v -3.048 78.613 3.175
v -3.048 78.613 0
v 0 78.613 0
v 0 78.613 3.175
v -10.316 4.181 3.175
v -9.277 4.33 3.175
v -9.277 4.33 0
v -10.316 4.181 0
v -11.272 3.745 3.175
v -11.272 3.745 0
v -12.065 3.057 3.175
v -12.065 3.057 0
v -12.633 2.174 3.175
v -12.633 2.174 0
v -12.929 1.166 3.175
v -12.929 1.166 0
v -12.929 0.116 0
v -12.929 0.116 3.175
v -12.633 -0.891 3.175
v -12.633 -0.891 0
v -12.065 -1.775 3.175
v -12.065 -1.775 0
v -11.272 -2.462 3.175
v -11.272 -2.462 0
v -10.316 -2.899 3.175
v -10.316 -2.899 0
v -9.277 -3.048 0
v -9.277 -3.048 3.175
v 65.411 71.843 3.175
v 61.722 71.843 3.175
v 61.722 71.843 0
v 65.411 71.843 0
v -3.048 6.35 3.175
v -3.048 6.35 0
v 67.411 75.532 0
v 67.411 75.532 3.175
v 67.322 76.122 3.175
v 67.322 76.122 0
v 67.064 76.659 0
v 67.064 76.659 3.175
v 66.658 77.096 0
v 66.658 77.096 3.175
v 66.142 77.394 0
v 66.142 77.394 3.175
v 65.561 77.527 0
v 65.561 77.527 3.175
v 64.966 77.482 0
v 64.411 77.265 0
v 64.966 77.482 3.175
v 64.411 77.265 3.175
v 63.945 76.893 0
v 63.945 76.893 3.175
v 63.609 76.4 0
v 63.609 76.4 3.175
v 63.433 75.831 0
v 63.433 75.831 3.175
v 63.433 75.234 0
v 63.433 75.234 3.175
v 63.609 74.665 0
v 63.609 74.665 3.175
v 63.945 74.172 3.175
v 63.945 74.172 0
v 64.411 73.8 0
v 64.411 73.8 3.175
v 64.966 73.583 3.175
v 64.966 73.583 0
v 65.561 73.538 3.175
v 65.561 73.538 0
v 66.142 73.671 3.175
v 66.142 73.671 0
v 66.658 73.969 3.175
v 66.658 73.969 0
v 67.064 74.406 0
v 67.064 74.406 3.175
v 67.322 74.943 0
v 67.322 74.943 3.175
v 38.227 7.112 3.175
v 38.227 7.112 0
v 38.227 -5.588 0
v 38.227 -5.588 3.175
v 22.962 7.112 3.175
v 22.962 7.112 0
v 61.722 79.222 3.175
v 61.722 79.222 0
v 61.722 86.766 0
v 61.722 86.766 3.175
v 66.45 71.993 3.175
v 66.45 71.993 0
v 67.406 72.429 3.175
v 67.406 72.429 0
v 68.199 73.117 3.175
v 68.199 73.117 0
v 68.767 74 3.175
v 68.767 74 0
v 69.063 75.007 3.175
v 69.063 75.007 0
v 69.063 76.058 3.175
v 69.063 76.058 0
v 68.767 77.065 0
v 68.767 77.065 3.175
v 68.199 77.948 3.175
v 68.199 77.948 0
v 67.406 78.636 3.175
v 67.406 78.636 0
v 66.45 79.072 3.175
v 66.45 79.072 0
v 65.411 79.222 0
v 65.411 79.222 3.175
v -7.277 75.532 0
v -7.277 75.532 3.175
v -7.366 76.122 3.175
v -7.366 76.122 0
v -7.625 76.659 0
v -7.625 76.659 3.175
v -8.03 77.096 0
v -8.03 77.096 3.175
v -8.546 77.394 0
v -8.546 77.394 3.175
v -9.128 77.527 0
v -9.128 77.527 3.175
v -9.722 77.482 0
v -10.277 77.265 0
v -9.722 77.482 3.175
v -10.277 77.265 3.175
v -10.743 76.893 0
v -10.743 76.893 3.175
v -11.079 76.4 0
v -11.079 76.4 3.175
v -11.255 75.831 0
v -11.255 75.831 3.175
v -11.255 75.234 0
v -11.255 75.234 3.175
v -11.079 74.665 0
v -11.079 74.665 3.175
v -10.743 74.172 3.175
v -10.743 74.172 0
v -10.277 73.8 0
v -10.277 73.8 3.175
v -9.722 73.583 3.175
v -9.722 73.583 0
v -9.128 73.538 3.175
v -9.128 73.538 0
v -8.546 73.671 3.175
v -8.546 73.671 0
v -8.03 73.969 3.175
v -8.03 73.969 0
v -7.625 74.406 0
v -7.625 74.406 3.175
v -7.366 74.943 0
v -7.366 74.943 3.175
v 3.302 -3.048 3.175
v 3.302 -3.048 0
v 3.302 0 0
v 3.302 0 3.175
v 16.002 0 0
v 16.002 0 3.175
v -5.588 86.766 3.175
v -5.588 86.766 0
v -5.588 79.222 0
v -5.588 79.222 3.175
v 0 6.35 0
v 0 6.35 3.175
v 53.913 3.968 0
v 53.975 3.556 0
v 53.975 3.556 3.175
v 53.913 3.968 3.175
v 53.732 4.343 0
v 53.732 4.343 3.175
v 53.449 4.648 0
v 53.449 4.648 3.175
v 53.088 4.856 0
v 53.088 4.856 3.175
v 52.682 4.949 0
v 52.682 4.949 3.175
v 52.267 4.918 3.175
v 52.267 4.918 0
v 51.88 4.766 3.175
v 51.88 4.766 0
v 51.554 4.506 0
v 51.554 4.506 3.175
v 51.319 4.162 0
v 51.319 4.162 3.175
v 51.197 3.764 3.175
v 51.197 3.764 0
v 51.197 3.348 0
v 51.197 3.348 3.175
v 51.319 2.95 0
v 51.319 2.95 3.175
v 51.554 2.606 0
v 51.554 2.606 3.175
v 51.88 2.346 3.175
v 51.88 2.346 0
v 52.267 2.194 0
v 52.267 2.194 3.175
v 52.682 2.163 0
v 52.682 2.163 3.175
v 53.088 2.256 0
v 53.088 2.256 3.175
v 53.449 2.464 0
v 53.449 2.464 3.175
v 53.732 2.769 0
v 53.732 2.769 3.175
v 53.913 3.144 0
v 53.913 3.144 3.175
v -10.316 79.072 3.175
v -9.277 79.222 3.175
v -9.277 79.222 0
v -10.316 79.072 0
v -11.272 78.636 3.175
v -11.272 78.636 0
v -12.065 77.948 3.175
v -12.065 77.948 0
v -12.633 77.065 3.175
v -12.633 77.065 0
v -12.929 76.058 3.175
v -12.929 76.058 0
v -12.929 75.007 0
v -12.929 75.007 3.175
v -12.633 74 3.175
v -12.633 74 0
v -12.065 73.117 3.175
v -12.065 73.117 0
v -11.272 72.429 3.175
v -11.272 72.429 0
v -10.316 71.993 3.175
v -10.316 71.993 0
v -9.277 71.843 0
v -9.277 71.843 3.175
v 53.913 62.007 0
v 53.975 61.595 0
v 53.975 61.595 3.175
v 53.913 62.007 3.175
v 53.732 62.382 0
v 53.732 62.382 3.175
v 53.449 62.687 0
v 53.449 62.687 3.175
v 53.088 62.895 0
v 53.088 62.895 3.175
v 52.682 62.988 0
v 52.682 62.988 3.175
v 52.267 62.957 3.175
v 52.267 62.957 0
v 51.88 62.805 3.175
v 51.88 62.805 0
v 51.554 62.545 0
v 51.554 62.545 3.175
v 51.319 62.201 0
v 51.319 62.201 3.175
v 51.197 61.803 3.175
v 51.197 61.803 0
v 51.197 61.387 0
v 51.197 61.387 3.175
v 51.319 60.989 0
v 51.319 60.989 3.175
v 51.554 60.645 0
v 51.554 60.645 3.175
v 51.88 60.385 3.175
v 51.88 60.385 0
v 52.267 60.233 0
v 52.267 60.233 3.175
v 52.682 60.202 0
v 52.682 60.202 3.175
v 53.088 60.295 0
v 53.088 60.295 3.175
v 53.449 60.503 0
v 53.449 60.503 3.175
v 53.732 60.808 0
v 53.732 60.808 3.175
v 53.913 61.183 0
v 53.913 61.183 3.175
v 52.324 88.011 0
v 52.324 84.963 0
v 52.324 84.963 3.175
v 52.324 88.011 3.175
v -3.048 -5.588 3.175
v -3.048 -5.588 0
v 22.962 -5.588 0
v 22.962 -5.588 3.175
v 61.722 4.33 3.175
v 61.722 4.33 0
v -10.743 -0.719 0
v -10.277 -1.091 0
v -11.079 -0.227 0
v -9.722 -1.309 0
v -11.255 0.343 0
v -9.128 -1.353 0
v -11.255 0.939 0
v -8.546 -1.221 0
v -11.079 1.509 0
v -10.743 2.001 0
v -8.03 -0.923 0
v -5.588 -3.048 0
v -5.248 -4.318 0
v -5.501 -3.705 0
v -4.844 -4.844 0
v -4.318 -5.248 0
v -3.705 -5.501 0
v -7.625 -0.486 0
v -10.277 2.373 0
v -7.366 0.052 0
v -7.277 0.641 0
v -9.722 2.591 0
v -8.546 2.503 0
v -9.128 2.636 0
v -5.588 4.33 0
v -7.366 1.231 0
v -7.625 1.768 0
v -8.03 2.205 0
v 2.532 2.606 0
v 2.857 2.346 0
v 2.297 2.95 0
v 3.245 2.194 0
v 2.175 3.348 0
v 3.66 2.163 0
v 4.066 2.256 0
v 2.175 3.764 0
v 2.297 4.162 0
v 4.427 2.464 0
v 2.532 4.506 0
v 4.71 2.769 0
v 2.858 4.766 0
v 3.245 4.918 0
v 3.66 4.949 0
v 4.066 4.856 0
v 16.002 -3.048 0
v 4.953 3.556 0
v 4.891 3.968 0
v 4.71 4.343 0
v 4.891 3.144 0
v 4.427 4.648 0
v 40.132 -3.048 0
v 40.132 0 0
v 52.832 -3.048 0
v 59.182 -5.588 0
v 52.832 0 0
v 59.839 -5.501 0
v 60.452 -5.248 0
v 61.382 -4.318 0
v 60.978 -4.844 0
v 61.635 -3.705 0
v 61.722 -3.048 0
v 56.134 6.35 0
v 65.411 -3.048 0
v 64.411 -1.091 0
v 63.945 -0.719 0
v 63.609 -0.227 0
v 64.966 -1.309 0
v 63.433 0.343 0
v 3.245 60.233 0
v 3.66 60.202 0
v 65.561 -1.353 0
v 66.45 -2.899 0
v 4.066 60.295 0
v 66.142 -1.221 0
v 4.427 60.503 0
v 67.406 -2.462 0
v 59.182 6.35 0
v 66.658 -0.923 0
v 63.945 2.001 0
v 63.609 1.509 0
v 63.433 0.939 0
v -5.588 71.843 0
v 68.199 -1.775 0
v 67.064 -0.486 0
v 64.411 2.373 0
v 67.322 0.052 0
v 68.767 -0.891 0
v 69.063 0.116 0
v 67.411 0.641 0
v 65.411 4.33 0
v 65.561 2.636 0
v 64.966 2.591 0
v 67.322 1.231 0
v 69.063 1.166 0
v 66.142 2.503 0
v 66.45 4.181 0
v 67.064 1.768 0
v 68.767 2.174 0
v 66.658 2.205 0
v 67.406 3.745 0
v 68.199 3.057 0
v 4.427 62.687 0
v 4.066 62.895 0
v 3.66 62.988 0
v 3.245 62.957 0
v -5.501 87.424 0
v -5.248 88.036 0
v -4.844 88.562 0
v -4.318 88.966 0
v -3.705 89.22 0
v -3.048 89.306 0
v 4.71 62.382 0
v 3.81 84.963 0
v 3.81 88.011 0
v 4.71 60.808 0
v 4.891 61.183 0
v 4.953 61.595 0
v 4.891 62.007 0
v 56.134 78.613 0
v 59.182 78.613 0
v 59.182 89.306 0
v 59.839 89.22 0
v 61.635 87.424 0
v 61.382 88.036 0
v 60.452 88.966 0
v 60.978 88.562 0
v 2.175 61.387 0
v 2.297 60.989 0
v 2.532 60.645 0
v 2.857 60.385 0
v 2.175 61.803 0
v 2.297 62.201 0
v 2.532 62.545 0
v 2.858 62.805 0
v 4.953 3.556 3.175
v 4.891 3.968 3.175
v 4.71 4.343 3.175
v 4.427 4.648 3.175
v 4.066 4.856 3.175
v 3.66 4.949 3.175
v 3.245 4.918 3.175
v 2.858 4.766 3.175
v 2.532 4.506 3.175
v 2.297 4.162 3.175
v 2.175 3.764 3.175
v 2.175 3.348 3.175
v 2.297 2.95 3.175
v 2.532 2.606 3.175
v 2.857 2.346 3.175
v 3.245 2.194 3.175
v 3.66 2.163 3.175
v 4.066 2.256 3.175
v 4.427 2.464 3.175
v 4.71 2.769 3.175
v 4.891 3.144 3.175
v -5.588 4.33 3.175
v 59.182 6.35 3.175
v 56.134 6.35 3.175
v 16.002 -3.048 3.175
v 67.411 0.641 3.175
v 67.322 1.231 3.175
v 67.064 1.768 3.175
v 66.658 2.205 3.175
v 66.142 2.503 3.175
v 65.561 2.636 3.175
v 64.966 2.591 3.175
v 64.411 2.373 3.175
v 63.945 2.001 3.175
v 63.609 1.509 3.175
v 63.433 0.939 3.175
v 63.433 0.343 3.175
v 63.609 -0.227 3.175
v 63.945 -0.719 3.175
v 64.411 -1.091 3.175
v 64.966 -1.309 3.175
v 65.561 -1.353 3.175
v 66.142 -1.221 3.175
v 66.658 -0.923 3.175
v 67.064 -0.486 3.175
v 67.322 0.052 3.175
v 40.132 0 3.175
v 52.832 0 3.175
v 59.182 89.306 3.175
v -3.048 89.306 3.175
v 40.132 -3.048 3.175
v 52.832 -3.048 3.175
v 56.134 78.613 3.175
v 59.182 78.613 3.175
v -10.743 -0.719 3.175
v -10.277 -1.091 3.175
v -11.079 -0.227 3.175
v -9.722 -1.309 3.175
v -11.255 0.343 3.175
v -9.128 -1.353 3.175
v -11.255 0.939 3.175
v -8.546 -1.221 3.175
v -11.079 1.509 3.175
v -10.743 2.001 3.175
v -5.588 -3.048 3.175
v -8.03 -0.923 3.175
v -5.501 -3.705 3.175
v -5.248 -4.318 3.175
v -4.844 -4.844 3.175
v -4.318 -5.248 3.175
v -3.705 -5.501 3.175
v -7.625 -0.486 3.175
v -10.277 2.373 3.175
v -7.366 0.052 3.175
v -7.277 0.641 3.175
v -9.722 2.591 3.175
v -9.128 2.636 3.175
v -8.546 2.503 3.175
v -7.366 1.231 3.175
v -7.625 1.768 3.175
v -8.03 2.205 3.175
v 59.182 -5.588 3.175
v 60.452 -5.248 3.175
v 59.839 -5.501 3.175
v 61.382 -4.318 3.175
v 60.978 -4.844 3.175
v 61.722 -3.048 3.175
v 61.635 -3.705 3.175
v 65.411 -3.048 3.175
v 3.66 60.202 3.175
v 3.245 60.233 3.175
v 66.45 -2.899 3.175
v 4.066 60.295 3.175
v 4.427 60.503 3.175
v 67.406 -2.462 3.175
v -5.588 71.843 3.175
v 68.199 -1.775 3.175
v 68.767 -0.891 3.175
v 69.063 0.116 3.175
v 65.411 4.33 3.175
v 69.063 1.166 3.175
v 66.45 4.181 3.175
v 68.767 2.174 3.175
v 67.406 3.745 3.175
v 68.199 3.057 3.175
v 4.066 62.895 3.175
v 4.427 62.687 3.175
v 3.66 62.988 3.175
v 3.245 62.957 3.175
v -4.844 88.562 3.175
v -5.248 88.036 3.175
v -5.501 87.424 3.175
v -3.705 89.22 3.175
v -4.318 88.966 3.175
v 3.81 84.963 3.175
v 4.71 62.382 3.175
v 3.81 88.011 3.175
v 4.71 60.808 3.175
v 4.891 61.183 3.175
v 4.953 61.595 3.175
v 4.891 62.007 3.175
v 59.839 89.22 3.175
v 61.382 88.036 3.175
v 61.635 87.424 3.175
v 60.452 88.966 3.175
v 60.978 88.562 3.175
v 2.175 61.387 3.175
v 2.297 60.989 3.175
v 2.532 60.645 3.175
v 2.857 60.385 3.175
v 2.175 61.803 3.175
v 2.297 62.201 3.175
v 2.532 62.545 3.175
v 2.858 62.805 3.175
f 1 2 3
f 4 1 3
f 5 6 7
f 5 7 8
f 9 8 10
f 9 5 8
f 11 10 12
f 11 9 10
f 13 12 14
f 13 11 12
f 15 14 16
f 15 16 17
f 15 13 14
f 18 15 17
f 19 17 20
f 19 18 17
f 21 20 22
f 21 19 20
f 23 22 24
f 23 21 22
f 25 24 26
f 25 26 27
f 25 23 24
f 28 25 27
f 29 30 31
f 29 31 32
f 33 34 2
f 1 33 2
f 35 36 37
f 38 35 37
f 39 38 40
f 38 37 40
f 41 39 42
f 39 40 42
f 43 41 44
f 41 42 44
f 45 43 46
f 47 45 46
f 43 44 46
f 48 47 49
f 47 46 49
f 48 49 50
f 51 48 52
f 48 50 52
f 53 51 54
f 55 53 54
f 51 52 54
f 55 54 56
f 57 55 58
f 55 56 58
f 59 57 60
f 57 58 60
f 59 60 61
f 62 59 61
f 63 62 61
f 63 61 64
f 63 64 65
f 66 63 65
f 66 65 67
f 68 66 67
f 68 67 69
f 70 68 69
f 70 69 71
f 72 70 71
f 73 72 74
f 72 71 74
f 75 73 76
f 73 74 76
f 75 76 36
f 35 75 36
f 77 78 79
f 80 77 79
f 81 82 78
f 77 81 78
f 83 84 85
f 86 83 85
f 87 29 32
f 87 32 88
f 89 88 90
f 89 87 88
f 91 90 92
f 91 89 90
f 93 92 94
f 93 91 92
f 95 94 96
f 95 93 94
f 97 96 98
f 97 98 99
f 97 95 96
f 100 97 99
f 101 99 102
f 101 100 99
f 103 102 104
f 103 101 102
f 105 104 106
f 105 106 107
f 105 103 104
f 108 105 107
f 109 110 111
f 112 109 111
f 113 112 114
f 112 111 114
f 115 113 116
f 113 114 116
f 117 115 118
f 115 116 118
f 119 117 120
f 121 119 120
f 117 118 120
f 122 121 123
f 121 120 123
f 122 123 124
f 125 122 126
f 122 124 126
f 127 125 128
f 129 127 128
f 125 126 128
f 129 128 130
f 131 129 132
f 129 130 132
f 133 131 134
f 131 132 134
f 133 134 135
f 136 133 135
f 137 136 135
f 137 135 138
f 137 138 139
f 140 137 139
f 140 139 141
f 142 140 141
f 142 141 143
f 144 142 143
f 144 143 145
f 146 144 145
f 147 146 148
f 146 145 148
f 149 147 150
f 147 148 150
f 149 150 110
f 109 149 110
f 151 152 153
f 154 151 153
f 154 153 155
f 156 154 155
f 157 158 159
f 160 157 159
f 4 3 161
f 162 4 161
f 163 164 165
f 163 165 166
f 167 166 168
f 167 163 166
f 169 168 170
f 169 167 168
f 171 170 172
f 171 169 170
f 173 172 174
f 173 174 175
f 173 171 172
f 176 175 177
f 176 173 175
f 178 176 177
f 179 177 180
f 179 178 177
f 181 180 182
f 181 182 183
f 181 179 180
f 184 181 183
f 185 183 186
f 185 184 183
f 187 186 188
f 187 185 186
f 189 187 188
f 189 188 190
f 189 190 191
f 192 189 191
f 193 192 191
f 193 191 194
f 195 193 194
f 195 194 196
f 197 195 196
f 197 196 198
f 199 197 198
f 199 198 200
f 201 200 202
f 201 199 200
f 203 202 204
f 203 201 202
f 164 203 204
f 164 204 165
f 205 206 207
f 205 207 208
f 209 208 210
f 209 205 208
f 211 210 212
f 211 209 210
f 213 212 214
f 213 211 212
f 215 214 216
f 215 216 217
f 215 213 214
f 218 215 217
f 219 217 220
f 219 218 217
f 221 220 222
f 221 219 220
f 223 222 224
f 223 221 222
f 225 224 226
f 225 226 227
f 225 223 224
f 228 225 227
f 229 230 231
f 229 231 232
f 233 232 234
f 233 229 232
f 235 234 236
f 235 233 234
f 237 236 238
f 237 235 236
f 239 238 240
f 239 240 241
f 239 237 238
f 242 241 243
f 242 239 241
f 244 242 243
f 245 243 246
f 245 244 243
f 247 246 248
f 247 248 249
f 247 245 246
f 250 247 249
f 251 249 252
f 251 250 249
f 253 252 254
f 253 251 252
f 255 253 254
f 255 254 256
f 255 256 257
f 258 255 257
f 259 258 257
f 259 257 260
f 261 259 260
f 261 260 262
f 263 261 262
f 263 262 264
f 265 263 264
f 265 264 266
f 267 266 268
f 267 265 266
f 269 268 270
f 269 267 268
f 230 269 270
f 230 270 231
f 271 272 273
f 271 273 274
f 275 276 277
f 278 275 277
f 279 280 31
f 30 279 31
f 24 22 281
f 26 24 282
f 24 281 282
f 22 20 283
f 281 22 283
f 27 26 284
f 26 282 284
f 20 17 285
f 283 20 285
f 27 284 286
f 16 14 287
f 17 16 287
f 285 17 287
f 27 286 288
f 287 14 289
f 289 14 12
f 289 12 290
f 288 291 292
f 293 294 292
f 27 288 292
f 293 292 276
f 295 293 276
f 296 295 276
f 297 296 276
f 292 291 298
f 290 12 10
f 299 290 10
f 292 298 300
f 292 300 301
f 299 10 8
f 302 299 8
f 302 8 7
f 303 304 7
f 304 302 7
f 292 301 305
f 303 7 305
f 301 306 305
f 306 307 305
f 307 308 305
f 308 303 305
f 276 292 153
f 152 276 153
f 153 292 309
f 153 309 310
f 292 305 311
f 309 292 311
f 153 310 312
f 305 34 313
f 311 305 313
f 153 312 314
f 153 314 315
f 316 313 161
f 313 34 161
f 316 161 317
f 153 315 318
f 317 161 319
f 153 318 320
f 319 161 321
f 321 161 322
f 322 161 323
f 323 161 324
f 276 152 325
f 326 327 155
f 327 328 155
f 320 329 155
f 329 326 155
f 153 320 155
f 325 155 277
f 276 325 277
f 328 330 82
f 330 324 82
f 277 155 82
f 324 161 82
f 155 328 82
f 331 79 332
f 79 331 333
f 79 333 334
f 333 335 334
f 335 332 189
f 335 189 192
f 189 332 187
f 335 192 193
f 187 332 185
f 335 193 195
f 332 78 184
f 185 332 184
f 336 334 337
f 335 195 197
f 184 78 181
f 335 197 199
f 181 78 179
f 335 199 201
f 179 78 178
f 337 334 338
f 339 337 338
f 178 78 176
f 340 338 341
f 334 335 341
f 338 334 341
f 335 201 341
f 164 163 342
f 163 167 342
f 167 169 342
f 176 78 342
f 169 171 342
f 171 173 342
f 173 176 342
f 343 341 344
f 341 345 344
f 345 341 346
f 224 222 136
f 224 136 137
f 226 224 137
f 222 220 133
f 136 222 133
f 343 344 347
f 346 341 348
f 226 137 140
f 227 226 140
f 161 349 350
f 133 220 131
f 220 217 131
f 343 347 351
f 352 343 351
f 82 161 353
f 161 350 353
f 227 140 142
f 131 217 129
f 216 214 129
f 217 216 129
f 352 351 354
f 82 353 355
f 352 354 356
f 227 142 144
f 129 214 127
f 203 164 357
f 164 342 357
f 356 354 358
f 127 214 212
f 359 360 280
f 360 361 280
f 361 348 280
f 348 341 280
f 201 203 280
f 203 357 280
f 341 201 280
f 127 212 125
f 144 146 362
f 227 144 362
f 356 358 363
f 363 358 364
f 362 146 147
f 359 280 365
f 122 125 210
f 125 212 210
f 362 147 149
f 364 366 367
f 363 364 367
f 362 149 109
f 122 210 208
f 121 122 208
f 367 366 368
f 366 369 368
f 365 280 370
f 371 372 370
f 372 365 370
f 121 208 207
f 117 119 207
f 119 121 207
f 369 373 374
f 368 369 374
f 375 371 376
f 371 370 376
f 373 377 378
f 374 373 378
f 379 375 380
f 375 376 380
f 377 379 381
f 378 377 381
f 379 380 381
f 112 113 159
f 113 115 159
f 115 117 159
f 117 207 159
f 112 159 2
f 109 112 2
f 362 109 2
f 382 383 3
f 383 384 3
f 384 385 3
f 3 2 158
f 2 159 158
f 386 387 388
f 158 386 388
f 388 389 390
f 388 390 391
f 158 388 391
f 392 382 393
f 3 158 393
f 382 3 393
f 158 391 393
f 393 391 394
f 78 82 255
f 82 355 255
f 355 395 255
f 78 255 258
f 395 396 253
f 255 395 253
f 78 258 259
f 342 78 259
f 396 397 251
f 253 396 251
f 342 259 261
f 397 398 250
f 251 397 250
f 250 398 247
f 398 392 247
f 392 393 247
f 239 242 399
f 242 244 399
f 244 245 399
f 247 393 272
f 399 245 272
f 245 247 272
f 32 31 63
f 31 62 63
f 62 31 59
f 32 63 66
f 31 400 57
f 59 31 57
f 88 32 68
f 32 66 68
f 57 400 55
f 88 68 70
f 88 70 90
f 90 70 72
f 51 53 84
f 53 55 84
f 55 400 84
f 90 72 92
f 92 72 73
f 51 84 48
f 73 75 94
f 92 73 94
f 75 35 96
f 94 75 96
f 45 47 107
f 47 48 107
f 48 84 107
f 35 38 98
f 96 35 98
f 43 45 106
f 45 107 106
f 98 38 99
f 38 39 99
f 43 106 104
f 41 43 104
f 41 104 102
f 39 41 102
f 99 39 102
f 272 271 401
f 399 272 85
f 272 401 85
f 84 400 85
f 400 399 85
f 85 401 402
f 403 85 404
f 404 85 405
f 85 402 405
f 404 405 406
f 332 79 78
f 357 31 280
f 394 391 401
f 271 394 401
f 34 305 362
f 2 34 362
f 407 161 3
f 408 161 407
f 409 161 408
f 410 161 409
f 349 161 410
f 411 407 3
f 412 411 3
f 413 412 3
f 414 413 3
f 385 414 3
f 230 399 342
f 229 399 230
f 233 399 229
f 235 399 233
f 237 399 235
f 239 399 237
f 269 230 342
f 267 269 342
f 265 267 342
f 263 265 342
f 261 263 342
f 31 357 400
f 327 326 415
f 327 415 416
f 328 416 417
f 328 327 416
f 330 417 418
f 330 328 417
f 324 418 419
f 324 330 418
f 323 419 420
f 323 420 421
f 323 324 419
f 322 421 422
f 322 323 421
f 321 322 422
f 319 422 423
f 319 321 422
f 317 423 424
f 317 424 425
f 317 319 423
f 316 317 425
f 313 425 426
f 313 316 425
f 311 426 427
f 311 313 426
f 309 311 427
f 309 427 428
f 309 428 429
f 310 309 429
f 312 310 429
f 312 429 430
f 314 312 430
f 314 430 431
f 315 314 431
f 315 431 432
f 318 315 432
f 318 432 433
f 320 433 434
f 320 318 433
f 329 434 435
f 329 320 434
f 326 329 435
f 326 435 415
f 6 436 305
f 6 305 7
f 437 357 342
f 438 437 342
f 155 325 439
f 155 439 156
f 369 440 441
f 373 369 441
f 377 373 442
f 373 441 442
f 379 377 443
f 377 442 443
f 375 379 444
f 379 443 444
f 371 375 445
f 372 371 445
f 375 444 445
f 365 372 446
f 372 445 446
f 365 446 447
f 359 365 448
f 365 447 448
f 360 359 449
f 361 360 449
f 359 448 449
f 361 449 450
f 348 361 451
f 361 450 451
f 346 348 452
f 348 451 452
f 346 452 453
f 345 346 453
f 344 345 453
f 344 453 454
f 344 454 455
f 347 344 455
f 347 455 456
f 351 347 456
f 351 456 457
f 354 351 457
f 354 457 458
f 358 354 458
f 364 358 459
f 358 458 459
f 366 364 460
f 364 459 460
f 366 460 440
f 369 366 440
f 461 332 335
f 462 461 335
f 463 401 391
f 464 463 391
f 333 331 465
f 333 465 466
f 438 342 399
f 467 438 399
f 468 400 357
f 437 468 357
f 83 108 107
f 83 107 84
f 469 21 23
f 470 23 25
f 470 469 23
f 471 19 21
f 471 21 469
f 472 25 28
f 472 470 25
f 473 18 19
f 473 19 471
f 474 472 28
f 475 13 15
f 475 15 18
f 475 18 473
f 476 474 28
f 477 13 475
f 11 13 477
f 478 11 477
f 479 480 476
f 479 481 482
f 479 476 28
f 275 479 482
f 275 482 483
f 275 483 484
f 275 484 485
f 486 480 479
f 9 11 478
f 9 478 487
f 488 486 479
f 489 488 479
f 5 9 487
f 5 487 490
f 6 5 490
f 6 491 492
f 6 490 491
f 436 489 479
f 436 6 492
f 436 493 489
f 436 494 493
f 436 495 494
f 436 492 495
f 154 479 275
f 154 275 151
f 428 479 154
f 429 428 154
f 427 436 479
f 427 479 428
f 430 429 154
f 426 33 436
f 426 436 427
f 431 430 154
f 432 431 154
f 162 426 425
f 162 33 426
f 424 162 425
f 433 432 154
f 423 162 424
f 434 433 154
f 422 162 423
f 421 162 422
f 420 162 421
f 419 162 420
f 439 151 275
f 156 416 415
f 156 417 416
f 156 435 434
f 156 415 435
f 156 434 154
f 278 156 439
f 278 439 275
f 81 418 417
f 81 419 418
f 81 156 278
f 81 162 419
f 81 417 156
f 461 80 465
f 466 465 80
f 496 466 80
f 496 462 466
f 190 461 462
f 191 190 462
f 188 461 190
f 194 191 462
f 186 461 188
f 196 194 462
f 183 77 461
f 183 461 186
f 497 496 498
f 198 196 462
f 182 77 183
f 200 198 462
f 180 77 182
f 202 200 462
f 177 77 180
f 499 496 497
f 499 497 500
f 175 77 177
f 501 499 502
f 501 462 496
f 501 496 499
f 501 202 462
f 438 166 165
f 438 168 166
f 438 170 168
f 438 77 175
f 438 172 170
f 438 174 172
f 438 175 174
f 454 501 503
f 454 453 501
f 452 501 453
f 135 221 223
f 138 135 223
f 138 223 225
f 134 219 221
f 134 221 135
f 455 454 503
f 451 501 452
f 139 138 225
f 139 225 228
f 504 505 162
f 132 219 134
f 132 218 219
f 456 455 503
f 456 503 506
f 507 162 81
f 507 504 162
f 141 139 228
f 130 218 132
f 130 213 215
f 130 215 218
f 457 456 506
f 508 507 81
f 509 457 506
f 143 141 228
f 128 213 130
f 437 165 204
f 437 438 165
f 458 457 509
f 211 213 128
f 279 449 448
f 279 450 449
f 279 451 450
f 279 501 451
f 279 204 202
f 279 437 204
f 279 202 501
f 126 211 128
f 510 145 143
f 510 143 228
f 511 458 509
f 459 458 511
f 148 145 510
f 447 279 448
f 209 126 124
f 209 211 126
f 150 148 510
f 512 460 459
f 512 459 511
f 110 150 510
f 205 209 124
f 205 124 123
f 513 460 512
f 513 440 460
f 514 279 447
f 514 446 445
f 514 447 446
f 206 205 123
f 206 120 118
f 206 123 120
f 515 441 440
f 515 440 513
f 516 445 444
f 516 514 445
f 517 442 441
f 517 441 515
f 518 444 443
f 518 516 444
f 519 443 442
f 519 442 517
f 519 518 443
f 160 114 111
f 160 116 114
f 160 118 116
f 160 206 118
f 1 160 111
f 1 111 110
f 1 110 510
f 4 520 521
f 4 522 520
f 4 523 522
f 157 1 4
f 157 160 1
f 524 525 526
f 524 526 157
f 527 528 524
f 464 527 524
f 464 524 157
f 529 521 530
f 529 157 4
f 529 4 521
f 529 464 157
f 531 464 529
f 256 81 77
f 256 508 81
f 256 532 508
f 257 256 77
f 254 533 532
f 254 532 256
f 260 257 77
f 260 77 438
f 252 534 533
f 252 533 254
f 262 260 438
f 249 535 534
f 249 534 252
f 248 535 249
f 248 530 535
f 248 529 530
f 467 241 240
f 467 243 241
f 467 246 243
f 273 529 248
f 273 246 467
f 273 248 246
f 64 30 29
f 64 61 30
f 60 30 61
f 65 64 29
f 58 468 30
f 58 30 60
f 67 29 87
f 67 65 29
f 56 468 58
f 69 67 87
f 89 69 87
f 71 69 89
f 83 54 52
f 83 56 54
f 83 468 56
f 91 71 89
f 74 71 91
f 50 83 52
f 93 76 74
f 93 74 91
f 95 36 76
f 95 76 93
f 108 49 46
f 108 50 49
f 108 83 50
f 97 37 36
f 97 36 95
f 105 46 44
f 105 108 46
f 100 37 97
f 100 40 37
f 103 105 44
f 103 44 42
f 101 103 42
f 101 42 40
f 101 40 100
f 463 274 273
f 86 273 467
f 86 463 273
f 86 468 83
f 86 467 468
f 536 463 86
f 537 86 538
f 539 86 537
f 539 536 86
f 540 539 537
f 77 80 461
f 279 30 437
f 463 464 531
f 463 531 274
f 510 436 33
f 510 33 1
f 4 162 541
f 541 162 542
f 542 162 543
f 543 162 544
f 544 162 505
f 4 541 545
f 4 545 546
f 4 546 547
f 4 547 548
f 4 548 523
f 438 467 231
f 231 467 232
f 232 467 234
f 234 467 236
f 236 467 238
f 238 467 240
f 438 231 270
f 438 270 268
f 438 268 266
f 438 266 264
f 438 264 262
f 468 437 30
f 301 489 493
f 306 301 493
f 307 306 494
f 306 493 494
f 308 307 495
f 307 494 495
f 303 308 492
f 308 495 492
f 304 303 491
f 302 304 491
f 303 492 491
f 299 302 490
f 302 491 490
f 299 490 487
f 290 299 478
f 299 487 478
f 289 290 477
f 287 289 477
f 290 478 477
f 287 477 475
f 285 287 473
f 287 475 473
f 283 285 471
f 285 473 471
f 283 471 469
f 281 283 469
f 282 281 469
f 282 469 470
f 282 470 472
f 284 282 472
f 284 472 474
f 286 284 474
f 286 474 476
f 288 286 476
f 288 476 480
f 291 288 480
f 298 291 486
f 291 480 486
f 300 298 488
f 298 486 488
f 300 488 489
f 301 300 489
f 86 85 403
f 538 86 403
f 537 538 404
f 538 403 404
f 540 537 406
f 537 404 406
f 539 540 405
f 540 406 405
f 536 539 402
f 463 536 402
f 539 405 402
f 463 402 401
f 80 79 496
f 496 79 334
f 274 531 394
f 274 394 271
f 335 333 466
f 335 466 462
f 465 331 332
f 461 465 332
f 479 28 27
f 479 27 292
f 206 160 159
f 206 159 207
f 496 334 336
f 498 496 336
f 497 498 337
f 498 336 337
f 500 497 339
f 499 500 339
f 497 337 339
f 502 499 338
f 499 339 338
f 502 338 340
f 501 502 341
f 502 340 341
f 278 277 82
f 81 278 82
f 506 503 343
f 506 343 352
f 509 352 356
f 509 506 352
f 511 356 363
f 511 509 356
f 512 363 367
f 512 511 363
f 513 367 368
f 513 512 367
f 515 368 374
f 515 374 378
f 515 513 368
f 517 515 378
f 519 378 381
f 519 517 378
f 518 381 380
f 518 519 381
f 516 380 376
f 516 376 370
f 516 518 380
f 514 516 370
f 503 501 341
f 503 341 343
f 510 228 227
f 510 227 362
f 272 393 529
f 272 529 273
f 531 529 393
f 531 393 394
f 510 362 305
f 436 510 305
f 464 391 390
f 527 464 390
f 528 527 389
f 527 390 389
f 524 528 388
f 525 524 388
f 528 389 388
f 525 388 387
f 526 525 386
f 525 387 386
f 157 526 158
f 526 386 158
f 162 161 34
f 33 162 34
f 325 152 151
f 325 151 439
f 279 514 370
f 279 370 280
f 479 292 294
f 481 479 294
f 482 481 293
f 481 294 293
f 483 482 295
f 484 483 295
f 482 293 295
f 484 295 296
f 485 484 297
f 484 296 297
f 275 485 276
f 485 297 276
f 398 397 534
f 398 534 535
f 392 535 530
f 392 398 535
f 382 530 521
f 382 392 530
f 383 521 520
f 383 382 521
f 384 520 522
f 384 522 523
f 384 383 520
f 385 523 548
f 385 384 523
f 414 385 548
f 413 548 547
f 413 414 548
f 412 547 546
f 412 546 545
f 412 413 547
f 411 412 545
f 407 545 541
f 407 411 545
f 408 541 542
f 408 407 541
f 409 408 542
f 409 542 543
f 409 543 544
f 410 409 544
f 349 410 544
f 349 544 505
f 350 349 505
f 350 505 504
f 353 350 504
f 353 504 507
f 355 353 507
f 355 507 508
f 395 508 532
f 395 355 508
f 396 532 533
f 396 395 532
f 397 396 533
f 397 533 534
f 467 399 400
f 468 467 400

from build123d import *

# Parameters (mm, degrees)
SKETCH1_W           = 12.7
SKETCH1_H           = 3.048
SKETCH1_R           = 1.397
SKETCH1_W_2         = 48.514
SKETCH1_H_2         = 1.8034
BOSS_EXTRUDE1_DEPTH = 3.175
SKETCH6_W           = 48.514
SKETCH6_H           = 3.048
CUT_EXTRUDE2_DEPTH  = 4.175
SKETCH5_R           = 3.6891
SKETCH5_R_2         = 2
BOSS_EXTRUDE3_DEPTH = 3.175


with BuildPart() as part:
    # Sketch1 → Boss-Extrude1 (new body)
    with BuildSketch(Plane.XY):
        with BuildLine():
            Line((38.227, 7.112), (38.227, 0))
            Line((38.227, 0), (38.227, -5.588))
            Line((38.227, -5.588), (59.182, -5.588))
            ThreePointArc((59.182, -5.588), (60.978051224, -4.844051224), (61.722, -3.048))
            Line((61.722, -3.048), (61.722, 86.7664))
            ThreePointArc((61.722, 86.7664), (60.978051224, 88.562451224), (59.182, 89.3064))
            Line((59.182, 89.3064), (-3.048, 89.3064))
            ThreePointArc((-3.048, 89.3064), (-4.844051224, 88.562451224), (-5.588, 86.7664))
            Line((-5.588, 86.7664), (-5.588, -3.048))
            ThreePointArc((-5.588, -3.048), (-4.844051224, -4.844051224), (-3.048, -5.588))
            Line((-3.048, -5.588), (22.9616, -5.588))
            Line((22.9616, -5.588), (22.9616, 0))
            Line((22.9616, 0), (22.9616, 7.112))
            Line((22.9616, 7.112), (38.227, 7.112))
        make_face()
        with Locations((9.652, -1.524)):
            Rectangle(SKETCH1_W, SKETCH1_H, mode=Mode.SUBTRACT)
        with Locations((3.556, 3.556)):
            Circle(SKETCH1_R, mode=Mode.SUBTRACT)
        with Locations((46.482, -1.524)):
            Rectangle(SKETCH1_W, SKETCH1_H, mode=Mode.SUBTRACT)
        with Locations((52.578, 3.556)):
            Circle(SKETCH1_R, mode=Mode.SUBTRACT)
        Polygon((-3.048, 6.35), (-3.048, 78.613), (0, 78.613), (0, 61.595), (0, 6.35), align=None, mode=Mode.SUBTRACT)
        with Locations((3.556, 61.595)):
            Circle(SKETCH1_R, mode=Mode.SUBTRACT)
        with Locations((28.067, 85.8647)):
            Rectangle(SKETCH1_W_2, SKETCH1_H_2, mode=Mode.SUBTRACT)
        Polygon((56.134, 78.613), (59.182, 78.613), (59.182, 6.35), (56.134, 6.35), (56.134, 61.595), align=None, mode=Mode.SUBTRACT)
        with Locations((52.578, 61.595)):
            Circle(SKETCH1_R, mode=Mode.SUBTRACT)
    extrude(amount=BOSS_EXTRUDE1_DEPTH)

    # Sketch6 → Cut-Extrude2 (cut, through all)
    with BuildSketch(Plane.XY.offset(3.175)):
        with Locations((28.067, 86.487)):
            Rectangle(SKETCH6_W, SKETCH6_H)
    extrude(amount=-CUT_EXTRUDE2_DEPTH, mode=Mode.SUBTRACT)

    # Sketch5 → Boss-Extrude3 (add)
    with BuildSketch(Plane.XY.offset(3.175)):
        with BuildLine():
            Line((-5.588, 4.3302), (-9.2771, 4.3302))
            ThreePointArc((-9.2771, 4.3302), (-6.668512374, 3.249687626), (-5.588, 0.6411))
            Line((-5.588, 0.6411), (-5.588, 4.3302))
        make_face()
        with BuildLine():
            Line((-5.588, -3.048), (-5.588, 0.6411))
            ThreePointArc((-5.588, 0.6411), (-6.668512374, -1.967487626), (-9.2771, -3.048))
            Line((-9.2771, -3.048), (-5.588, -3.048))
        make_face()
        with Locations((-9.2771, 0.6411)):
            Circle(SKETCH5_R)
        with Locations((-9.2771, 0.6411)):
            Circle(SKETCH5_R_2, mode=Mode.SUBTRACT)
        with Locations((65.4111, 0.6411)):
            Circle(SKETCH5_R)
        with Locations((65.4111, 0.6411)):
            Circle(SKETCH5_R_2, mode=Mode.SUBTRACT)
        with BuildLine():
            Line((61.722, -3.048), (65.4111, -3.048))
            ThreePointArc((65.4111, -3.048), (62.802512374, -1.967487626), (61.722, 0.6411))
            Line((61.722, 0.6411), (61.722, -3.048))
        make_face()
        with BuildLine():
            Line((61.722, 4.3302), (61.722, 0.6411))
            ThreePointArc((61.722, 0.6411), (62.802512374, 3.249687626), (65.4111, 4.3302))
            Line((65.4111, 4.3302), (61.722, 4.3302))
        make_face()
        with Locations((65.4111, 75.5325)):
            Circle(SKETCH5_R)
        with Locations((65.4111, 75.5325)):
            Circle(SKETCH5_R_2, mode=Mode.SUBTRACT)
        with BuildLine():
            Line((61.722, 71.8434), (65.4111, 71.8434))
            ThreePointArc((65.4111, 71.8434), (62.802512374, 72.923912374), (61.722, 75.5325))
            Line((61.722, 75.5325), (61.722, 71.8434))
        make_face()
        with BuildLine():
            Line((61.722, 79.2216), (61.722, 75.5325))
            ThreePointArc((61.722, 75.5325), (62.802512374, 78.141087626), (65.4111, 79.2216))
            Line((65.4111, 79.2216), (61.722, 79.2216))
        make_face()
        with BuildLine():
            Line((-5.588, 71.8434), (-5.588, 75.5325))
            ThreePointArc((-5.588, 75.5325), (-6.668512374, 72.923912374), (-9.2771, 71.8434))
            Line((-9.2771, 71.8434), (-5.588, 71.8434))
        make_face()
        with Locations((-9.2771, 75.5325)):
            Circle(SKETCH5_R)
        with Locations((-9.2771, 75.5325)):
            Circle(SKETCH5_R_2, mode=Mode.SUBTRACT)
        with BuildLine():
            Line((-5.588, 79.2216), (-9.2771, 79.2216))
            ThreePointArc((-9.2771, 79.2216), (-6.668512374, 78.141087626), (-5.588, 75.5325))
            Line((-5.588, 75.5325), (-5.588, 79.2216))
        make_face()
    extrude(amount=-BOSS_EXTRUDE3_DEPTH)


solid = part.part
